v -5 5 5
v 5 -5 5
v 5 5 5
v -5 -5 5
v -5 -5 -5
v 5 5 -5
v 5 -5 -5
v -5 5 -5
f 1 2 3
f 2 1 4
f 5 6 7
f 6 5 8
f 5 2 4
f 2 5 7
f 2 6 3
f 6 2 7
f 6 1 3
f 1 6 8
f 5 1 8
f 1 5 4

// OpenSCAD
// A parametric cube for testing.

// BEGIN_PARAMS
// Size of the cube in mm
size = 10;


// Height multiplier
height_factor = 1;
// END_PARAMS

cube([size, size, size * height_factor], center = true);
